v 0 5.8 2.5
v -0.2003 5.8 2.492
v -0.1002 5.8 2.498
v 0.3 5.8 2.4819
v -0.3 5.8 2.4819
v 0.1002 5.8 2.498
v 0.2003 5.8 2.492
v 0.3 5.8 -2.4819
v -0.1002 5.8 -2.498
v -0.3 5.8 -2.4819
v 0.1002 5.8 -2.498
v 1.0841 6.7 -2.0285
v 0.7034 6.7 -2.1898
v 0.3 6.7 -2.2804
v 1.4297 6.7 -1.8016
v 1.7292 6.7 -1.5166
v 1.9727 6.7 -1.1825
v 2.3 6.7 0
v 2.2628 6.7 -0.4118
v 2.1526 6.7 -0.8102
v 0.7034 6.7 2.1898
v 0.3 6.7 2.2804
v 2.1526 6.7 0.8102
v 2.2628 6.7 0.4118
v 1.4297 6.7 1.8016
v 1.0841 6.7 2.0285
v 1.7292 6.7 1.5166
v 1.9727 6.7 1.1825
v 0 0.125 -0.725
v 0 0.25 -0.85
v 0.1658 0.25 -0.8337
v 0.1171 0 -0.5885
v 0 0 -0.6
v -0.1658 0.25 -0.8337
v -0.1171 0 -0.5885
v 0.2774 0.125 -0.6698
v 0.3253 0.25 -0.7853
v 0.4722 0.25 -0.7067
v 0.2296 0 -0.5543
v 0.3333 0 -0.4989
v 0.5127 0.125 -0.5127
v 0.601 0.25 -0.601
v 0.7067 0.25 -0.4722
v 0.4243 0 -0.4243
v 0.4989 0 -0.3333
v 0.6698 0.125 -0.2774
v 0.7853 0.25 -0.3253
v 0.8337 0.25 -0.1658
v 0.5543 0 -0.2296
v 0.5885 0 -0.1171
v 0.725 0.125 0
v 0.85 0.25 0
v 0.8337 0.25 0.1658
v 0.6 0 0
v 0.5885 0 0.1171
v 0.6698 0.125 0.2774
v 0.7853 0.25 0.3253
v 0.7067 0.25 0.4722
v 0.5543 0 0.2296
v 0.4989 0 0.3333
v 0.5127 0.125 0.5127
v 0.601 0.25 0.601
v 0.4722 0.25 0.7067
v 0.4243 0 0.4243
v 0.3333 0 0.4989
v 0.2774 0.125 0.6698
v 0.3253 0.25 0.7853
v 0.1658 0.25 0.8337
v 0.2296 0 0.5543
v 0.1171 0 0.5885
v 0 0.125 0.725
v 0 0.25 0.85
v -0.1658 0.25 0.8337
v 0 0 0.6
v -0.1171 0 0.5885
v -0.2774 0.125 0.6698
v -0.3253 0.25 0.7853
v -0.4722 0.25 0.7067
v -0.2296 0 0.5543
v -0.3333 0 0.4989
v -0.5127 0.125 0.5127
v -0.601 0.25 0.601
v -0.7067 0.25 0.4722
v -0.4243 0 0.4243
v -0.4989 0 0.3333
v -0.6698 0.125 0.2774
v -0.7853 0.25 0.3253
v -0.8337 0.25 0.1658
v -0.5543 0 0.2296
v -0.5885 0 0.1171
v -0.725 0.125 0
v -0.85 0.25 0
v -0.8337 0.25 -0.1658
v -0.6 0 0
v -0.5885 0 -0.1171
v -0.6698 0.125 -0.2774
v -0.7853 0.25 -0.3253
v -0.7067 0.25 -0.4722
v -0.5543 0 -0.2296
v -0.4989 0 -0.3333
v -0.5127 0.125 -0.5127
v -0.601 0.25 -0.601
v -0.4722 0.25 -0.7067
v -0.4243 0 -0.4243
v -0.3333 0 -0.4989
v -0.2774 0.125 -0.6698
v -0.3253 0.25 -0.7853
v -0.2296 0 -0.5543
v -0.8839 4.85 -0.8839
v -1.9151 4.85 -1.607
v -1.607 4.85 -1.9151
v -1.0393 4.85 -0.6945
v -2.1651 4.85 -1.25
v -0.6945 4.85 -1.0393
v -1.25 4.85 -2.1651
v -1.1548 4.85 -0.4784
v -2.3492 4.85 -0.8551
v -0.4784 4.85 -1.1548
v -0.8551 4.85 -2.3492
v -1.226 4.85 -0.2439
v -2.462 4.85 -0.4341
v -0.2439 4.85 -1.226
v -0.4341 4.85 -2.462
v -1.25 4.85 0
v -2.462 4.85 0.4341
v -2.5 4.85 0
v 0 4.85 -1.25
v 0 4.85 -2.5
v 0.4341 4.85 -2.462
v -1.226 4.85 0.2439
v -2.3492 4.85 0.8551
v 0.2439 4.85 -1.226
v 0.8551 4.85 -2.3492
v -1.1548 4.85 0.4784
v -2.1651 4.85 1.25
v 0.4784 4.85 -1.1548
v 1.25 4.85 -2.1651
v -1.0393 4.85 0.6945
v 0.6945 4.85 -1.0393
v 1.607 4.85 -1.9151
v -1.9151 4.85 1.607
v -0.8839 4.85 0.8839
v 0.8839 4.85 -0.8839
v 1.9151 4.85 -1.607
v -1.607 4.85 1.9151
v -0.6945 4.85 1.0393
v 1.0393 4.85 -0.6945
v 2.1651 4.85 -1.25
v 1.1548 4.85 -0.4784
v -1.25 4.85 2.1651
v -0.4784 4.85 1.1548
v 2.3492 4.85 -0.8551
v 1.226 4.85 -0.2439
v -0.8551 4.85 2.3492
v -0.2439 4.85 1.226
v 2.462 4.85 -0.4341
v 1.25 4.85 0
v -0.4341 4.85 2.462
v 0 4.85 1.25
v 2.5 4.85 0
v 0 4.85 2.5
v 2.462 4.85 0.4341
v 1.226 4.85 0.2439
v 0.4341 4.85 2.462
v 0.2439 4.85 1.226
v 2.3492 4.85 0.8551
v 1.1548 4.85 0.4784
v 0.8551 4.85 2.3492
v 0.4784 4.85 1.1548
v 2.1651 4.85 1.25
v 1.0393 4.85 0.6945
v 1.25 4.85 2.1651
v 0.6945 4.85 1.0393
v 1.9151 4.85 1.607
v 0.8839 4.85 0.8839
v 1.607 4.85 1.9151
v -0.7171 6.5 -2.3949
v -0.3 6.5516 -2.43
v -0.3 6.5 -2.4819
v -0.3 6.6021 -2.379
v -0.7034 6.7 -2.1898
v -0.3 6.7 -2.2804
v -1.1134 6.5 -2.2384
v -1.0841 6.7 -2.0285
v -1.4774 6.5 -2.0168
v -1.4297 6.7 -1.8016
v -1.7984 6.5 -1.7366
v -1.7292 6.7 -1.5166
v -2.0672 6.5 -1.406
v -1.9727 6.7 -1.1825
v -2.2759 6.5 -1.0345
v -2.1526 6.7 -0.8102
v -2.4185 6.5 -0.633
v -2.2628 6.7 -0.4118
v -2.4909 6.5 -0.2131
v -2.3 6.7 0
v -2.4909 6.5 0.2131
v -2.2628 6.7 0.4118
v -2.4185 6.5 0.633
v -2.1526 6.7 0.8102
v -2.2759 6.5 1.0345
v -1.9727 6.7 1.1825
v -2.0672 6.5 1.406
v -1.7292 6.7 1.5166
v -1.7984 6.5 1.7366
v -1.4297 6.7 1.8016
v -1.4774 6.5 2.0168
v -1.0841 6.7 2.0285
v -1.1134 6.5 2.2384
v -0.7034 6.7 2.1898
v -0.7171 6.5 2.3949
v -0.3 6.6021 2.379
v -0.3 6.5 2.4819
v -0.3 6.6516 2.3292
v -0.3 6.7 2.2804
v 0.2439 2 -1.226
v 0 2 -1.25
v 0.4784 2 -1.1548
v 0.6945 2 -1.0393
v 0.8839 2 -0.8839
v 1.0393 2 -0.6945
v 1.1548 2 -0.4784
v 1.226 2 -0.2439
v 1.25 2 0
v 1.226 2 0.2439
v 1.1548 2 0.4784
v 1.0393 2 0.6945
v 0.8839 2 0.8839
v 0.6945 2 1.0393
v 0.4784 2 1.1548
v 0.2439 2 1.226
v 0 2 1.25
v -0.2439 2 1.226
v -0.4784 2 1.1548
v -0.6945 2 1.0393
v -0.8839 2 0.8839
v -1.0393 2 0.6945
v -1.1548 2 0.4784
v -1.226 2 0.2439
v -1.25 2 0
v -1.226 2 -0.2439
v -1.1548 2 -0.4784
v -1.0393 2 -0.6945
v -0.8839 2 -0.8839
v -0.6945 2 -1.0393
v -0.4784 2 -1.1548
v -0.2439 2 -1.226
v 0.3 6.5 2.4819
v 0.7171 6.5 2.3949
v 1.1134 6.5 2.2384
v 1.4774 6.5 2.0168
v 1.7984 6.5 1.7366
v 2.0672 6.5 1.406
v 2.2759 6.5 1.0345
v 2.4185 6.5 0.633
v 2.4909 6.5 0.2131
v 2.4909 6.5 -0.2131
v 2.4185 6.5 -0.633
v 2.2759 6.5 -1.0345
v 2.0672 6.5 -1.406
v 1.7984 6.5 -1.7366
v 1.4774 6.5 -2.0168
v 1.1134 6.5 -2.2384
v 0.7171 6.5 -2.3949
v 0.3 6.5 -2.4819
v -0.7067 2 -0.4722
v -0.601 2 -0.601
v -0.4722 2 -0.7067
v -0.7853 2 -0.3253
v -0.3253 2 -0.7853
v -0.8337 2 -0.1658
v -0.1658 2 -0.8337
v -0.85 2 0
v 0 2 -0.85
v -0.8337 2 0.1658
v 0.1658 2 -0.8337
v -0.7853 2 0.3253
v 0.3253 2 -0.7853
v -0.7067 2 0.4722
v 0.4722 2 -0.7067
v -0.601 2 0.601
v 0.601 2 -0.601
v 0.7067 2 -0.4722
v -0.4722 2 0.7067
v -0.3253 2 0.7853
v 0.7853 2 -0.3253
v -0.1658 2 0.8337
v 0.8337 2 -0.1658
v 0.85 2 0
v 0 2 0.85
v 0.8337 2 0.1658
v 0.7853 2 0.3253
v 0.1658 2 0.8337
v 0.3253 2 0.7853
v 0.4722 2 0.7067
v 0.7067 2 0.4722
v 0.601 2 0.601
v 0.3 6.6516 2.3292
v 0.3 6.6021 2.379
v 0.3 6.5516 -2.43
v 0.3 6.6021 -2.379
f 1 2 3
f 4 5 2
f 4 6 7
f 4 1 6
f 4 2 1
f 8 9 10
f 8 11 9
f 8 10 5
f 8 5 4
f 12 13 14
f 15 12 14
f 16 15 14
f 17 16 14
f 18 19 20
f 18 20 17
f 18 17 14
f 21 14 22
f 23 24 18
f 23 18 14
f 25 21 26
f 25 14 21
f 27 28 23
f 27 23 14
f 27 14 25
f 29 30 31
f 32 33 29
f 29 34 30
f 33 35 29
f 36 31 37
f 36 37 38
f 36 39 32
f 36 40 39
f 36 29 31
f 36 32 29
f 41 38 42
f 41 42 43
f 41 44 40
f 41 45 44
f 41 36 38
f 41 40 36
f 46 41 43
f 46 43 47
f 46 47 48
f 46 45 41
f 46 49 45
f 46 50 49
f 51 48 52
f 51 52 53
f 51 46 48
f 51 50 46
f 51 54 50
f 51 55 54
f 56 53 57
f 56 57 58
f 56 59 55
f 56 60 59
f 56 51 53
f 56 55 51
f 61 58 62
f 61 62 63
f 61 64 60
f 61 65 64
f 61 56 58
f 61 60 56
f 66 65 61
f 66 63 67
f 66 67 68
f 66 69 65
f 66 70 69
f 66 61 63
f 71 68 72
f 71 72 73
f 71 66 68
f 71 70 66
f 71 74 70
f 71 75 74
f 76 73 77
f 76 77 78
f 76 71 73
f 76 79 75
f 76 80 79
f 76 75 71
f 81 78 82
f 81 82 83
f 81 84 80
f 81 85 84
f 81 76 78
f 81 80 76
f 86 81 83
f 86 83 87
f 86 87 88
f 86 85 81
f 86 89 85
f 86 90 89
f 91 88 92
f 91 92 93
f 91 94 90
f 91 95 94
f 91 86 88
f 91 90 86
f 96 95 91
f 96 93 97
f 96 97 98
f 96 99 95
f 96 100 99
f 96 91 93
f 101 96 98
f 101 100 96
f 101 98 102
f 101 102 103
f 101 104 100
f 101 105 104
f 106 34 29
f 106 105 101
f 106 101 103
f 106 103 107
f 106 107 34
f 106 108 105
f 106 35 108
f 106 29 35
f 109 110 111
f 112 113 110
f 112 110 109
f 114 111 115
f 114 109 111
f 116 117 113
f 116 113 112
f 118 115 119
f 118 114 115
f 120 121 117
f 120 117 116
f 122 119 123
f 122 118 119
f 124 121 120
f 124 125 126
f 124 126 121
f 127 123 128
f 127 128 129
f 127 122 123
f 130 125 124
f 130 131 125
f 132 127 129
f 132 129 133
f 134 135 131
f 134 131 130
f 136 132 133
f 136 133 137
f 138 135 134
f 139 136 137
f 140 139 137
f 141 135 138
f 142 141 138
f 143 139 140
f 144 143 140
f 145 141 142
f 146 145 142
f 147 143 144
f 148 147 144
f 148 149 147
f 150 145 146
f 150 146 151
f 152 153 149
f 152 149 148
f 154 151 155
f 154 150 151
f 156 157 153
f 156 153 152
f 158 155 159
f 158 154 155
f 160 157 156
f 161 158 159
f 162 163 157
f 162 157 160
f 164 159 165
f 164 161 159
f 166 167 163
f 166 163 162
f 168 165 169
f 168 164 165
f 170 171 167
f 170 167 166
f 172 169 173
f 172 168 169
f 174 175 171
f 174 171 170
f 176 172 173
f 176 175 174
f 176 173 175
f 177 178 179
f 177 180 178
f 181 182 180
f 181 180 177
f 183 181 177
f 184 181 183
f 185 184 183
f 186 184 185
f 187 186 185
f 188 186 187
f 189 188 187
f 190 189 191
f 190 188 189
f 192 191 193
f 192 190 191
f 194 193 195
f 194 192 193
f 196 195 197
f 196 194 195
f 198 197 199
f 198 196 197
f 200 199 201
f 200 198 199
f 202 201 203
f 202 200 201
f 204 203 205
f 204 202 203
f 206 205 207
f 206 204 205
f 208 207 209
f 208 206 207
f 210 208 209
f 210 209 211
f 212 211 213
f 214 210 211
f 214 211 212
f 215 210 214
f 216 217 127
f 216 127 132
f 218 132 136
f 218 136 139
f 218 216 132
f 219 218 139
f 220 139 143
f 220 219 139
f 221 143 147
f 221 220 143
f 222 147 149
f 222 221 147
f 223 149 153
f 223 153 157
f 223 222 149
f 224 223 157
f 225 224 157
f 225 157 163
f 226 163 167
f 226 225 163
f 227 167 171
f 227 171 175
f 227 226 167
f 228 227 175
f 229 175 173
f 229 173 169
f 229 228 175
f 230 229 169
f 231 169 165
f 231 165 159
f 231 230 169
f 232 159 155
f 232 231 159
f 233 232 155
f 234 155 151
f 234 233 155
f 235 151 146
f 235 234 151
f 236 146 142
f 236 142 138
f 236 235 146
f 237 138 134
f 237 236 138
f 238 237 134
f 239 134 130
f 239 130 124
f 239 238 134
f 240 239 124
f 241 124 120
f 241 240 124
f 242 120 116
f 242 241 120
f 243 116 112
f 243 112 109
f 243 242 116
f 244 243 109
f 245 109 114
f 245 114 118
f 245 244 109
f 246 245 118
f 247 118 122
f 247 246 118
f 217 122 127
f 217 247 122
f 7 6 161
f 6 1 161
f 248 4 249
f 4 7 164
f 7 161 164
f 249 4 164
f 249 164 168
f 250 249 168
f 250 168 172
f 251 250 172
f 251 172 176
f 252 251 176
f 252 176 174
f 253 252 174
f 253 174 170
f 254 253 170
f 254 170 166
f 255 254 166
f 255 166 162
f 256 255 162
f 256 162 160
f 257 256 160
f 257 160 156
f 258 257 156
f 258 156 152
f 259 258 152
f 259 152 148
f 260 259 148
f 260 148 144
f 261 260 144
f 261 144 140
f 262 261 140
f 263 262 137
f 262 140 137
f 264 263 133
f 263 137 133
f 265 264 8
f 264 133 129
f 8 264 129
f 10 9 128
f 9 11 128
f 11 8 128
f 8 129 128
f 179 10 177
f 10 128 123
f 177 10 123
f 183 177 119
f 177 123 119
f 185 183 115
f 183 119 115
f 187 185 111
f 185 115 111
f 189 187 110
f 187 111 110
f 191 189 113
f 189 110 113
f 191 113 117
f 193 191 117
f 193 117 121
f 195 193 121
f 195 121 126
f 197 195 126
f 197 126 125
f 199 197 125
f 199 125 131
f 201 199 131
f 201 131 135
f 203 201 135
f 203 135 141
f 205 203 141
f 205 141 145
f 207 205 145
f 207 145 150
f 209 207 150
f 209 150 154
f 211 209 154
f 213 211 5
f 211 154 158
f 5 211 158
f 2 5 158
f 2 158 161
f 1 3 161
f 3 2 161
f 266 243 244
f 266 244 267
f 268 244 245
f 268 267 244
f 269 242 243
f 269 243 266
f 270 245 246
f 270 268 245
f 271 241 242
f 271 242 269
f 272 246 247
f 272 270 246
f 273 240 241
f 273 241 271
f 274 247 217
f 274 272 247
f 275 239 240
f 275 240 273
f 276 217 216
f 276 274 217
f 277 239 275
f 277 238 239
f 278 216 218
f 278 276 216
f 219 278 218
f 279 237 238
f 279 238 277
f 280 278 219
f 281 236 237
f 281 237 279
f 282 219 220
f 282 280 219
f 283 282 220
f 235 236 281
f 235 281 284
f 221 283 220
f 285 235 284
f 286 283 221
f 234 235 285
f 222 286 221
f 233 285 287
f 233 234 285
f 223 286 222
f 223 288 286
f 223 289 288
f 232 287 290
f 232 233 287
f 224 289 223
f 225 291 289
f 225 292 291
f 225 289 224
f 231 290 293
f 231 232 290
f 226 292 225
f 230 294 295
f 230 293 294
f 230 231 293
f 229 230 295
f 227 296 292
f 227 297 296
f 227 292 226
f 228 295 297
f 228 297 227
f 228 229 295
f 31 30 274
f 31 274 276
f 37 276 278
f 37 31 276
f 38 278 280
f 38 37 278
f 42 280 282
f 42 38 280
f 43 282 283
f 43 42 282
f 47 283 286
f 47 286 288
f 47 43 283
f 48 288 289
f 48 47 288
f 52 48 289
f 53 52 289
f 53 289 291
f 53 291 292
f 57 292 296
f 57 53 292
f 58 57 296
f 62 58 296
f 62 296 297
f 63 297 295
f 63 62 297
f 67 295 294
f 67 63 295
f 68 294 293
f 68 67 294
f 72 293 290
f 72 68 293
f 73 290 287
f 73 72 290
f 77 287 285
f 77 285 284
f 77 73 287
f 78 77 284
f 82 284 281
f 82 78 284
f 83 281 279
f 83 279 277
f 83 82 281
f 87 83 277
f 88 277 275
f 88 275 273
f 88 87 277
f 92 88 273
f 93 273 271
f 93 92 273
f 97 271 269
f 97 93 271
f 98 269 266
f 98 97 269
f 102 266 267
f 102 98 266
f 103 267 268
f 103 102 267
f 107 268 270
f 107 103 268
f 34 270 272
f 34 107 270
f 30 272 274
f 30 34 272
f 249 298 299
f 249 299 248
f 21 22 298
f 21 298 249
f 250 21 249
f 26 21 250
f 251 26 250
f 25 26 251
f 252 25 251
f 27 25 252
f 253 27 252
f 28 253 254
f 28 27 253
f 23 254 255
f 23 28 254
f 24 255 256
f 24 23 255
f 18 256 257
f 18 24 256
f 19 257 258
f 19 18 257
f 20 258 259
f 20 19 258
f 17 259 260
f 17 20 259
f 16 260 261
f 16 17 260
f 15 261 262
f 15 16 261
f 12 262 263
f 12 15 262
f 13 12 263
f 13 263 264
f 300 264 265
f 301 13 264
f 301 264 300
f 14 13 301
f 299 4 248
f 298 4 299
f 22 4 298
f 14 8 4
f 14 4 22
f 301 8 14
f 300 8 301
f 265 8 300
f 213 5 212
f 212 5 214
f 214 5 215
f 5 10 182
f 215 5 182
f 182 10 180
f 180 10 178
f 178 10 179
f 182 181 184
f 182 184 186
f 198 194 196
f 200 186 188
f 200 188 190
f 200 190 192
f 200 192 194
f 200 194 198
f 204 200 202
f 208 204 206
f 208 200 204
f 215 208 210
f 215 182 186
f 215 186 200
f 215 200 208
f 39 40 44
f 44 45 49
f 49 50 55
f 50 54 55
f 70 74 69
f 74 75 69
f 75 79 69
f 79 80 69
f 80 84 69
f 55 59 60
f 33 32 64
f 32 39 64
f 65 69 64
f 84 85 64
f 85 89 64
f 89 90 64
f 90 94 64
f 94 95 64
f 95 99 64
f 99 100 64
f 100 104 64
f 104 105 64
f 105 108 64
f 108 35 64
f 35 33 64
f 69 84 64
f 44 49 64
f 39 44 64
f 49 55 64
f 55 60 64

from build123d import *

# Parameters (mm, degrees)
SKETCH1_R               = 2.5
BOSS_EXTRUDE1_DEPTH     = 6.7
SKETCH2_OUTSIDE_W       = 8.948
SKETCH2_OUTSIDE_H       = 8.948
SKETCH2_OUTSIDE_R       = 0.85
CUT_EXTRUDE1_DEPTH      = 2
SKETCH3_OUTSIDE_W       = 8.948
SKETCH3_OUTSIDE_H       = 8.948
SKETCH3_OUTSIDE_R       = 1.25
CUT_EXTRUDE2_DEPTH      = 2.85
CHAMFER1_SIZE           = 0.2
CUT_EXTRUDE3_DEPTH      = 8.575618787
CUT_EXTRUDE3_DEPTH_BACK = 8.575618787
SKETCH4_W               = 0.6
SKETCH4_H               = 0.9
CHAMFER2_SIZE           = 0.25


with BuildPart() as part:
    # Sketch1 → Boss-Extrude1 (new body)
    with BuildSketch(Plane(origin=(0, 0, 0), x_dir=(1, 0, 0), z_dir=(0, 1, 0))):
        with Locations(Location((0, 0, 0), (0, 0, 270))):
            Circle(SKETCH1_R)
    extrude(amount=BOSS_EXTRUDE1_DEPTH)

    # Sketch2 outside → Cut-Extrude1 (cut)
    with BuildSketch(Plane.XZ):
        Rectangle(SKETCH2_OUTSIDE_W, SKETCH2_OUTSIDE_H)
        with Locations(Location((0, 0, 0), (0, 0, 270))):
            Circle(SKETCH2_OUTSIDE_R, mode=Mode.SUBTRACT)
    extrude(amount=-CUT_EXTRUDE1_DEPTH, mode=Mode.SUBTRACT)

    # Sketch3 outside → Cut-Extrude2 (cut)
    with BuildSketch(Plane.XZ.offset(-2)):
        Rectangle(SKETCH3_OUTSIDE_W, SKETCH3_OUTSIDE_H)
        with Locations(Location((0, 0, 0), (0, 0, 270))):
            Circle(SKETCH3_OUTSIDE_R, mode=Mode.SUBTRACT)
    extrude(amount=-CUT_EXTRUDE2_DEPTH, mode=Mode.SUBTRACT)

    # Chamfer1
    chamfer1_edges = [part.edges().sort_by_distance(p)[0] for p in [
        (0, 6.7, -2.5),
    ]]
    chamfer(chamfer1_edges, length=CHAMFER1_SIZE)

    # Sketch4 → Cut-Extrude3 (cut, two sides: drawn at the far end of the back side and taken through both)
    with BuildSketch(Plane.XY.offset(-CUT_EXTRUDE3_DEPTH_BACK)):
        with Locations((0, 6.25)):
            Rectangle(SKETCH4_W, SKETCH4_H)
    extrude(amount=CUT_EXTRUDE3_DEPTH + CUT_EXTRUDE3_DEPTH_BACK, mode=Mode.SUBTRACT)

    # Chamfer2
    chamfer2_edges = [part.edges().sort_by_distance(p)[0] for p in [
        (0, 0, 0.85),
    ]]
    chamfer(chamfer2_edges, length=CHAMFER2_SIZE)


solid = part.part
